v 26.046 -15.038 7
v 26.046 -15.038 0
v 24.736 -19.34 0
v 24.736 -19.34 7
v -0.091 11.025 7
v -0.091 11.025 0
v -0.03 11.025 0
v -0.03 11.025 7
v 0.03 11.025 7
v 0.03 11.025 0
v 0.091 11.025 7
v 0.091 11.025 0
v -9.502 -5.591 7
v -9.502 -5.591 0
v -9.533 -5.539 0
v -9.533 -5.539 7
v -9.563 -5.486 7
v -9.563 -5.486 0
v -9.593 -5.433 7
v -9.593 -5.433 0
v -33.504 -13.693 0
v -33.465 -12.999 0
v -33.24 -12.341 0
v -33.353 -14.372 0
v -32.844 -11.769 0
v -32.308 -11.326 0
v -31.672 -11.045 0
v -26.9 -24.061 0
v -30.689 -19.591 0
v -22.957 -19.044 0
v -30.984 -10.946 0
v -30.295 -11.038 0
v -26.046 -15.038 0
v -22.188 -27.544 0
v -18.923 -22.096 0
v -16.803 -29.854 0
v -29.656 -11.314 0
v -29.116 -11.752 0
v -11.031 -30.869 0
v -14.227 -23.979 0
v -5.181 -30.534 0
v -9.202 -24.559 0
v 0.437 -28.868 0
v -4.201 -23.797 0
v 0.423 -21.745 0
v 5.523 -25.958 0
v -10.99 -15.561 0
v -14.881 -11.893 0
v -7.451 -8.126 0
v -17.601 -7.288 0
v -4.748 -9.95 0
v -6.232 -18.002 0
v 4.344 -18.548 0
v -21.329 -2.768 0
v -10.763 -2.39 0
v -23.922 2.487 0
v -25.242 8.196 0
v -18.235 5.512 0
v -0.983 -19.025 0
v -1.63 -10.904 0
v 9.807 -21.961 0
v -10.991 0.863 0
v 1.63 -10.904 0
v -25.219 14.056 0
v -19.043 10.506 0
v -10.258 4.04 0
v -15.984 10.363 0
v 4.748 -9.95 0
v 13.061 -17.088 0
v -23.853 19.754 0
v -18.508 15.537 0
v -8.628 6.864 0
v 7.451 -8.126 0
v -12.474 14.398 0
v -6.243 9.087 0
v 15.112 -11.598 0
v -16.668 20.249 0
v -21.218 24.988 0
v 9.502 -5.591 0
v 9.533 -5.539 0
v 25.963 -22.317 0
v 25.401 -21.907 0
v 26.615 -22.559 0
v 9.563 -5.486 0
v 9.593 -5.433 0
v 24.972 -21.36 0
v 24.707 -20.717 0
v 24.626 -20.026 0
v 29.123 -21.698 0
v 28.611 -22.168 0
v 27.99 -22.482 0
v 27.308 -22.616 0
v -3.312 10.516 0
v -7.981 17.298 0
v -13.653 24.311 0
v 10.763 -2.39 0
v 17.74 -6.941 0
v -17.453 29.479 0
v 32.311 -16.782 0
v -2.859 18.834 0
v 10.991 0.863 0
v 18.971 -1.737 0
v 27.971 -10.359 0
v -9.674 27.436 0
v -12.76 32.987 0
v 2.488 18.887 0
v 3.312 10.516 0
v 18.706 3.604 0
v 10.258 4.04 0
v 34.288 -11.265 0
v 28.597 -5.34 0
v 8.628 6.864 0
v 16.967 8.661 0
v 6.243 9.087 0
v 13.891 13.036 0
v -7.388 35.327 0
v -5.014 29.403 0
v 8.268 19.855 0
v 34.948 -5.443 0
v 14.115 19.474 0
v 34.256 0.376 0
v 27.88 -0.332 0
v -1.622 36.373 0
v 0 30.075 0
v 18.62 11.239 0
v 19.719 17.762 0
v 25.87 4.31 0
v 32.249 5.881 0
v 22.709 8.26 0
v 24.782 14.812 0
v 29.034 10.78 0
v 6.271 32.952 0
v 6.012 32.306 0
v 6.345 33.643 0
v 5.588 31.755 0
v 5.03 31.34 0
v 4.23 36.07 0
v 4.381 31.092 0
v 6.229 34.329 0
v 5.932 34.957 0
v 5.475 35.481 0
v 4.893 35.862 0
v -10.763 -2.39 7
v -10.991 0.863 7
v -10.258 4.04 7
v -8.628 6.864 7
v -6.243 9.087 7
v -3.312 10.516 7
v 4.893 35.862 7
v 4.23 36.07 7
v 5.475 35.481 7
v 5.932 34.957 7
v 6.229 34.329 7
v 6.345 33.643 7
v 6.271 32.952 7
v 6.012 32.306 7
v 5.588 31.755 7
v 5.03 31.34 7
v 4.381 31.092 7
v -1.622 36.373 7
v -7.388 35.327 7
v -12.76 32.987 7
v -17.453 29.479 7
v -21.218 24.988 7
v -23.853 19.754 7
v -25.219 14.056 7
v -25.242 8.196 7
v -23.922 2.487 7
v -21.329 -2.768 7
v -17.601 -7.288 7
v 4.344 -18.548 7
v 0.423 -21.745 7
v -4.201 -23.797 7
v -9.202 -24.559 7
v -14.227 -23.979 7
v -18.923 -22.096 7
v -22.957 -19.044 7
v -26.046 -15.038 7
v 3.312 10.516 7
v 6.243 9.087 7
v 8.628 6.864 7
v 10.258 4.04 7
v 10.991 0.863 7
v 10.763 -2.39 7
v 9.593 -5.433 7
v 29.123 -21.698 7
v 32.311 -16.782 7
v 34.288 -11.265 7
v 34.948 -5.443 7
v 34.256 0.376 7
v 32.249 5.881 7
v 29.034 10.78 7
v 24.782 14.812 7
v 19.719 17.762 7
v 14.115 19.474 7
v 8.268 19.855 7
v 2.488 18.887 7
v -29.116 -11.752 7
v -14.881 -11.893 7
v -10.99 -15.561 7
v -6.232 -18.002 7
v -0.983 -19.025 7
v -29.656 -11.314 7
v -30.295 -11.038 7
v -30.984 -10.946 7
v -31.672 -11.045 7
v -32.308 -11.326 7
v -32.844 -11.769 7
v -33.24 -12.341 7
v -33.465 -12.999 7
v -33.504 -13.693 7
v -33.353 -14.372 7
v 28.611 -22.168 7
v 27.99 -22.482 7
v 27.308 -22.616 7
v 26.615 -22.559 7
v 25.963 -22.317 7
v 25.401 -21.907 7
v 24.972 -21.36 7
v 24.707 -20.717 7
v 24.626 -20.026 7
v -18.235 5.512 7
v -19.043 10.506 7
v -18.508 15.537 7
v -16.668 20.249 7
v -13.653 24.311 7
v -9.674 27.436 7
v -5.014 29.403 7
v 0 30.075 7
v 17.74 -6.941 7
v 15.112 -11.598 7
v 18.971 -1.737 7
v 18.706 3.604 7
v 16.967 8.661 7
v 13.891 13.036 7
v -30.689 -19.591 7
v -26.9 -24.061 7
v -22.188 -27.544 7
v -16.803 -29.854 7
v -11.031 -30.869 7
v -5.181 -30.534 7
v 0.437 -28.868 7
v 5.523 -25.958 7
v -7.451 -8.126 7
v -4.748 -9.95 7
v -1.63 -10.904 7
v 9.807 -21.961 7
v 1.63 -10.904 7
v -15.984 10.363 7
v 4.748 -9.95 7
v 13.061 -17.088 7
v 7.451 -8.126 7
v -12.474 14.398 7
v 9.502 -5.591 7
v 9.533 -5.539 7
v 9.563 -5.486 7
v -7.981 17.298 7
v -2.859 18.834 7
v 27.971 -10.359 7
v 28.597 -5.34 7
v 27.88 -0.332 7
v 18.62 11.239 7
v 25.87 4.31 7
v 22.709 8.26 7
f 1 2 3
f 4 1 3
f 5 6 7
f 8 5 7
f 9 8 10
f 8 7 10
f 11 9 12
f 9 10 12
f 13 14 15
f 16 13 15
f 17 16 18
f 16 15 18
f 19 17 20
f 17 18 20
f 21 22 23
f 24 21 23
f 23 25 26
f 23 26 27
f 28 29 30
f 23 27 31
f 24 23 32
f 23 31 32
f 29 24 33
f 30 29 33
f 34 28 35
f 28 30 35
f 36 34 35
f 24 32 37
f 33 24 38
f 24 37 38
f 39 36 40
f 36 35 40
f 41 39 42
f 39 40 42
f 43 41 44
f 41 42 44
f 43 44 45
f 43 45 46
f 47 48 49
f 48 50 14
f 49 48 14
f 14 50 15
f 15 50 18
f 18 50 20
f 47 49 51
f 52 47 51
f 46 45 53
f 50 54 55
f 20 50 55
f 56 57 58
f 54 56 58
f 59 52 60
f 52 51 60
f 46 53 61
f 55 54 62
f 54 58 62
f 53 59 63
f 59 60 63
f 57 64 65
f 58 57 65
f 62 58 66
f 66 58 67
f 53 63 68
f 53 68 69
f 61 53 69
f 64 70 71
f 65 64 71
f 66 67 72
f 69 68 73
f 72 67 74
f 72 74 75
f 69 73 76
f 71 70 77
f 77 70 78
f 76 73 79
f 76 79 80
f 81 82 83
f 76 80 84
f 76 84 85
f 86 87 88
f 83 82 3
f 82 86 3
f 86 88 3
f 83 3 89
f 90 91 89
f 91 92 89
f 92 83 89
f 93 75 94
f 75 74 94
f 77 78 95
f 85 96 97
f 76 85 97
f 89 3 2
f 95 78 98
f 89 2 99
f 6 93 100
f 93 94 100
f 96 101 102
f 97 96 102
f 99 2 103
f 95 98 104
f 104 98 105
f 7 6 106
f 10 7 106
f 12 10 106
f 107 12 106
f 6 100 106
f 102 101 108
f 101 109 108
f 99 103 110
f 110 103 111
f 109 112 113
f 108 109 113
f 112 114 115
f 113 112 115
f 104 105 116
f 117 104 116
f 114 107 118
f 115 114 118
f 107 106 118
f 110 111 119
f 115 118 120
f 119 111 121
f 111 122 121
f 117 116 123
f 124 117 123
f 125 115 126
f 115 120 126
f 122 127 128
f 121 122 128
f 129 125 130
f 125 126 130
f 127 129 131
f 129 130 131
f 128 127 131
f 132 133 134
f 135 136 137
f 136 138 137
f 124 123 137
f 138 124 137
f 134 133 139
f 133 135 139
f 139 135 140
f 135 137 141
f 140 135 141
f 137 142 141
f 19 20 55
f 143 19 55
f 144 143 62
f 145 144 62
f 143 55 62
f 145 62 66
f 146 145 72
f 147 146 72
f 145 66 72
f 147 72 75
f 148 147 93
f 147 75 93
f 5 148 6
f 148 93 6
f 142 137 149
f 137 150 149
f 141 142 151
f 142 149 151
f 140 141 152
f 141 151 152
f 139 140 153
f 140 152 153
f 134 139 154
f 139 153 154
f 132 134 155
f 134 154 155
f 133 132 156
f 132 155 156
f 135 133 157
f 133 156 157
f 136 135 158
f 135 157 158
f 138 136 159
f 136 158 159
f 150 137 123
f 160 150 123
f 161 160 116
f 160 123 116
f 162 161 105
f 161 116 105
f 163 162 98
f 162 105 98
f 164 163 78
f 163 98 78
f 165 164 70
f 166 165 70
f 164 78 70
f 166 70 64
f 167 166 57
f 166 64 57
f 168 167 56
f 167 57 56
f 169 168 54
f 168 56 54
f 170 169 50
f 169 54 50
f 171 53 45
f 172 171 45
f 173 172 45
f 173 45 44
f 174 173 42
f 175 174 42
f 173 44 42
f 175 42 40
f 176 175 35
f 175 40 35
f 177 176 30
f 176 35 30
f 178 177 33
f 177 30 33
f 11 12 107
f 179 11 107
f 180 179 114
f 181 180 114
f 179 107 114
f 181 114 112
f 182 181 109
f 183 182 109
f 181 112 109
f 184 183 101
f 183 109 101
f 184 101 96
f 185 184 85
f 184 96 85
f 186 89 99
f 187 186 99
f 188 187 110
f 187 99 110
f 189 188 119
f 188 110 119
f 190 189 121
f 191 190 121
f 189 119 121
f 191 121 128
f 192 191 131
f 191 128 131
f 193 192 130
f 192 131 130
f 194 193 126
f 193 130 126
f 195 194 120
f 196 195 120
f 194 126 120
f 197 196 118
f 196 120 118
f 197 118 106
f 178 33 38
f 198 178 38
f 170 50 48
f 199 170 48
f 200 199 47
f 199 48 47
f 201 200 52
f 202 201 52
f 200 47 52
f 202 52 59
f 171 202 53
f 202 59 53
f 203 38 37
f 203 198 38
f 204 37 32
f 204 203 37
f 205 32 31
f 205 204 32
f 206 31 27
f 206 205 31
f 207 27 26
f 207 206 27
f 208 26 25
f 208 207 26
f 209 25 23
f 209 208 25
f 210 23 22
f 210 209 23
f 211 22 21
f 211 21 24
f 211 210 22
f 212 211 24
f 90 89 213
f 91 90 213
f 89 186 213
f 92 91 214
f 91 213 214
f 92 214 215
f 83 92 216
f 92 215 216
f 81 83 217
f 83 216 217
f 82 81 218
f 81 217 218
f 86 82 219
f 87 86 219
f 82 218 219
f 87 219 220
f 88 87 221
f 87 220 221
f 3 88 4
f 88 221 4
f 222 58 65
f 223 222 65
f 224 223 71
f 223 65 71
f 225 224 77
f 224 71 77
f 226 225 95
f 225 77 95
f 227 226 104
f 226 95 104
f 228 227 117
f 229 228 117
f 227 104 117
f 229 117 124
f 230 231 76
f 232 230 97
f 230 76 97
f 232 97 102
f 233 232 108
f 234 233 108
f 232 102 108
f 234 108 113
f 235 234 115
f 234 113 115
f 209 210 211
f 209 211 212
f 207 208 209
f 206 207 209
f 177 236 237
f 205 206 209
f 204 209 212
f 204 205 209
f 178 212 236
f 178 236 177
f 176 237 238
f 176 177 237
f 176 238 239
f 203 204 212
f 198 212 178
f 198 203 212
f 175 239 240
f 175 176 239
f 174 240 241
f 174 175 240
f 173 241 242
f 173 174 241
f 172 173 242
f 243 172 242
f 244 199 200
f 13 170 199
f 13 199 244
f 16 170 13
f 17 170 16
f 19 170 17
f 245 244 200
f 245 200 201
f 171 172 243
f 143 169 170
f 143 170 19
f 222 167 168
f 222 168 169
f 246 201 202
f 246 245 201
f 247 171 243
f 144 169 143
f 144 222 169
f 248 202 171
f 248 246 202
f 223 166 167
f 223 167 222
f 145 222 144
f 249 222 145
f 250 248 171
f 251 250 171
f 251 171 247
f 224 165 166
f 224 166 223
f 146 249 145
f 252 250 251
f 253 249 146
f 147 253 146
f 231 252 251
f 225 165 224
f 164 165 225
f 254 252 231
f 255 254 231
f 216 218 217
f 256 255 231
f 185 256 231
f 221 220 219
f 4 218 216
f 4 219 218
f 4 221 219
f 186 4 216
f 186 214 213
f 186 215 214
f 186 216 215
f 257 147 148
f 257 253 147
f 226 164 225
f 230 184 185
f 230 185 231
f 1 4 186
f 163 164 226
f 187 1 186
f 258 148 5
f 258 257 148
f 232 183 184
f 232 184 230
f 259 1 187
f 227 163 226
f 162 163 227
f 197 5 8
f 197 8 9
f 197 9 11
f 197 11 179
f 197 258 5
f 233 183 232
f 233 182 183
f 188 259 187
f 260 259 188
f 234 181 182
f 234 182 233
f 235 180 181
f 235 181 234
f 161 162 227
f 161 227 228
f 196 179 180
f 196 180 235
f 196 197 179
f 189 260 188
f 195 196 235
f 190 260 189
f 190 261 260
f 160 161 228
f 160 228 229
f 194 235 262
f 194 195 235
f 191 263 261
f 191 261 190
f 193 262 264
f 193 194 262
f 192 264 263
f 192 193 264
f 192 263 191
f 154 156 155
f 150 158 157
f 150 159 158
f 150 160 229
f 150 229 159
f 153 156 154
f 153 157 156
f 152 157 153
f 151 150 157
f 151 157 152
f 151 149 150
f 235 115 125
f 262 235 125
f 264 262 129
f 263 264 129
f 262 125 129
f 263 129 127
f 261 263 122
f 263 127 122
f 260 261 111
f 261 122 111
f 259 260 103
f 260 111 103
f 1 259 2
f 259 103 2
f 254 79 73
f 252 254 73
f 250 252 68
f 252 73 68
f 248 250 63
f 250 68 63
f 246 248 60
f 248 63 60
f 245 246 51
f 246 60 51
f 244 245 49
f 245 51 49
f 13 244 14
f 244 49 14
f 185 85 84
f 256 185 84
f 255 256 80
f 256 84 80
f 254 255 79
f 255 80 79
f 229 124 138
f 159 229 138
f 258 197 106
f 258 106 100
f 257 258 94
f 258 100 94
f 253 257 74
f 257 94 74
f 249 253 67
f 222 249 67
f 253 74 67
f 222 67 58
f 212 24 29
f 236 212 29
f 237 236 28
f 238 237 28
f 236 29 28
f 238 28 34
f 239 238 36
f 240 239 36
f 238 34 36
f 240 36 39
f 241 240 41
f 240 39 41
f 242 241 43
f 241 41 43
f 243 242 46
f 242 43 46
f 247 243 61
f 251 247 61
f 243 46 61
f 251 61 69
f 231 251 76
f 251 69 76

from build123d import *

# Parameters (mm, degrees)
F1_DEPTH = 7
F2_R     = 2.54


# Not quite as in the source:
# - a feature names something its author has since deleted; it is built from what else it names


with BuildPart() as f1:
    # F0 (on Top) → F1 (new body)
    with BuildSketch(Plane.XY):
        with BuildLine():
            ThreePointArc((12.7, 33.0220452561), (-20.3035705189, 26.2868814104), (-17.6006612279, -7.2882936508))
            ThreePointArc((-17.6006612279, -7.2882936508), (-8.6968003579, -16.9489870947), (4.3435297347, -18.5482141848))
            ThreePointArc((4.3435297347, -18.5482141848), (-11.7341390993, -24.436637764), (-26.0457140188, -15.0375))
            Line((-26.0457140188, -15.0375), (-34.9479300767, -5.5125))
            ThreePointArc((-34.9479300767, -5.5125), (-12.6133218282, -30.7268485621), (15.1121780658, -11.5984729214))
            ThreePointArc((15.1121780658, -11.5984729214), (19.0266535713, 0.9428435058), (13.8914598115, 13.0357141848))
            ThreePointArc((13.8914598115, 13.0357141848), (27.0298186363, 2.0562563305), (26.0457140188, -15.0375))
            Line((26.0457140188, -15.0375), (22.2479300767, -27.5095452561))
            ThreePointArc((22.2479300767, -27.5095452561), (32.9168923471, 4.4399671517), (2.4884831621, 18.8867665722))
            ThreePointArc((2.4884831621, 18.8867665722), (-10.3298532135, 16.0061435889), (-18.2349895462, 5.5125))
            ThreePointArc((-18.2349895462, 5.5125), (-15.295679537, 22.3803814335), (0, 30.075))
            Line((0, 30.075), (12.7, 33.0220452561))
        make_face()
        with BuildLine():
            ThreePointArc((0.0913914699, 11.0246211998), (7.8280973408, 7.7634732577), (11.025, 0))
            ThreePointArc((11.025, 0), (10.6610677893, -2.8093163923), (9.5932977611, -5.4331632653))
            ThreePointArc((9.5932977611, -5.4331632653), (9.5479300767, -5.5125), (9.5019062912, -5.5914579345))
            ThreePointArc((9.5019062912, -5.5914579345), (0, -11.025), (-9.5019062912, -5.5914579345))
            ThreePointArc((-9.5019062912, -5.5914579345), (-9.5479300767, -5.5125), (-9.5932977611, -5.4331632653))
            ThreePointArc((-9.5932977611, -5.4331632653), (-9.5479300767, 5.5125), (-0.0913914699, 11.0246211998))
            ThreePointArc((-0.0913914699, 11.0246211998), (0, 11.025), (0.0913914699, 11.0246211998))
        make_face(mode=Mode.SUBTRACT)
    extrude(amount=F1_DEPTH)

    # F2
    f2_edges = [f1.edges().sort_by_distance(p)[0] for p in [
        (12.7, 33.022045, 3.5),
        (22.24793, -27.509545, 3.5),
        (-34.94793, -5.5125, 3.5),
    ]]
    fillet(f2_edges, radius=F2_R)


solid = f1.part
